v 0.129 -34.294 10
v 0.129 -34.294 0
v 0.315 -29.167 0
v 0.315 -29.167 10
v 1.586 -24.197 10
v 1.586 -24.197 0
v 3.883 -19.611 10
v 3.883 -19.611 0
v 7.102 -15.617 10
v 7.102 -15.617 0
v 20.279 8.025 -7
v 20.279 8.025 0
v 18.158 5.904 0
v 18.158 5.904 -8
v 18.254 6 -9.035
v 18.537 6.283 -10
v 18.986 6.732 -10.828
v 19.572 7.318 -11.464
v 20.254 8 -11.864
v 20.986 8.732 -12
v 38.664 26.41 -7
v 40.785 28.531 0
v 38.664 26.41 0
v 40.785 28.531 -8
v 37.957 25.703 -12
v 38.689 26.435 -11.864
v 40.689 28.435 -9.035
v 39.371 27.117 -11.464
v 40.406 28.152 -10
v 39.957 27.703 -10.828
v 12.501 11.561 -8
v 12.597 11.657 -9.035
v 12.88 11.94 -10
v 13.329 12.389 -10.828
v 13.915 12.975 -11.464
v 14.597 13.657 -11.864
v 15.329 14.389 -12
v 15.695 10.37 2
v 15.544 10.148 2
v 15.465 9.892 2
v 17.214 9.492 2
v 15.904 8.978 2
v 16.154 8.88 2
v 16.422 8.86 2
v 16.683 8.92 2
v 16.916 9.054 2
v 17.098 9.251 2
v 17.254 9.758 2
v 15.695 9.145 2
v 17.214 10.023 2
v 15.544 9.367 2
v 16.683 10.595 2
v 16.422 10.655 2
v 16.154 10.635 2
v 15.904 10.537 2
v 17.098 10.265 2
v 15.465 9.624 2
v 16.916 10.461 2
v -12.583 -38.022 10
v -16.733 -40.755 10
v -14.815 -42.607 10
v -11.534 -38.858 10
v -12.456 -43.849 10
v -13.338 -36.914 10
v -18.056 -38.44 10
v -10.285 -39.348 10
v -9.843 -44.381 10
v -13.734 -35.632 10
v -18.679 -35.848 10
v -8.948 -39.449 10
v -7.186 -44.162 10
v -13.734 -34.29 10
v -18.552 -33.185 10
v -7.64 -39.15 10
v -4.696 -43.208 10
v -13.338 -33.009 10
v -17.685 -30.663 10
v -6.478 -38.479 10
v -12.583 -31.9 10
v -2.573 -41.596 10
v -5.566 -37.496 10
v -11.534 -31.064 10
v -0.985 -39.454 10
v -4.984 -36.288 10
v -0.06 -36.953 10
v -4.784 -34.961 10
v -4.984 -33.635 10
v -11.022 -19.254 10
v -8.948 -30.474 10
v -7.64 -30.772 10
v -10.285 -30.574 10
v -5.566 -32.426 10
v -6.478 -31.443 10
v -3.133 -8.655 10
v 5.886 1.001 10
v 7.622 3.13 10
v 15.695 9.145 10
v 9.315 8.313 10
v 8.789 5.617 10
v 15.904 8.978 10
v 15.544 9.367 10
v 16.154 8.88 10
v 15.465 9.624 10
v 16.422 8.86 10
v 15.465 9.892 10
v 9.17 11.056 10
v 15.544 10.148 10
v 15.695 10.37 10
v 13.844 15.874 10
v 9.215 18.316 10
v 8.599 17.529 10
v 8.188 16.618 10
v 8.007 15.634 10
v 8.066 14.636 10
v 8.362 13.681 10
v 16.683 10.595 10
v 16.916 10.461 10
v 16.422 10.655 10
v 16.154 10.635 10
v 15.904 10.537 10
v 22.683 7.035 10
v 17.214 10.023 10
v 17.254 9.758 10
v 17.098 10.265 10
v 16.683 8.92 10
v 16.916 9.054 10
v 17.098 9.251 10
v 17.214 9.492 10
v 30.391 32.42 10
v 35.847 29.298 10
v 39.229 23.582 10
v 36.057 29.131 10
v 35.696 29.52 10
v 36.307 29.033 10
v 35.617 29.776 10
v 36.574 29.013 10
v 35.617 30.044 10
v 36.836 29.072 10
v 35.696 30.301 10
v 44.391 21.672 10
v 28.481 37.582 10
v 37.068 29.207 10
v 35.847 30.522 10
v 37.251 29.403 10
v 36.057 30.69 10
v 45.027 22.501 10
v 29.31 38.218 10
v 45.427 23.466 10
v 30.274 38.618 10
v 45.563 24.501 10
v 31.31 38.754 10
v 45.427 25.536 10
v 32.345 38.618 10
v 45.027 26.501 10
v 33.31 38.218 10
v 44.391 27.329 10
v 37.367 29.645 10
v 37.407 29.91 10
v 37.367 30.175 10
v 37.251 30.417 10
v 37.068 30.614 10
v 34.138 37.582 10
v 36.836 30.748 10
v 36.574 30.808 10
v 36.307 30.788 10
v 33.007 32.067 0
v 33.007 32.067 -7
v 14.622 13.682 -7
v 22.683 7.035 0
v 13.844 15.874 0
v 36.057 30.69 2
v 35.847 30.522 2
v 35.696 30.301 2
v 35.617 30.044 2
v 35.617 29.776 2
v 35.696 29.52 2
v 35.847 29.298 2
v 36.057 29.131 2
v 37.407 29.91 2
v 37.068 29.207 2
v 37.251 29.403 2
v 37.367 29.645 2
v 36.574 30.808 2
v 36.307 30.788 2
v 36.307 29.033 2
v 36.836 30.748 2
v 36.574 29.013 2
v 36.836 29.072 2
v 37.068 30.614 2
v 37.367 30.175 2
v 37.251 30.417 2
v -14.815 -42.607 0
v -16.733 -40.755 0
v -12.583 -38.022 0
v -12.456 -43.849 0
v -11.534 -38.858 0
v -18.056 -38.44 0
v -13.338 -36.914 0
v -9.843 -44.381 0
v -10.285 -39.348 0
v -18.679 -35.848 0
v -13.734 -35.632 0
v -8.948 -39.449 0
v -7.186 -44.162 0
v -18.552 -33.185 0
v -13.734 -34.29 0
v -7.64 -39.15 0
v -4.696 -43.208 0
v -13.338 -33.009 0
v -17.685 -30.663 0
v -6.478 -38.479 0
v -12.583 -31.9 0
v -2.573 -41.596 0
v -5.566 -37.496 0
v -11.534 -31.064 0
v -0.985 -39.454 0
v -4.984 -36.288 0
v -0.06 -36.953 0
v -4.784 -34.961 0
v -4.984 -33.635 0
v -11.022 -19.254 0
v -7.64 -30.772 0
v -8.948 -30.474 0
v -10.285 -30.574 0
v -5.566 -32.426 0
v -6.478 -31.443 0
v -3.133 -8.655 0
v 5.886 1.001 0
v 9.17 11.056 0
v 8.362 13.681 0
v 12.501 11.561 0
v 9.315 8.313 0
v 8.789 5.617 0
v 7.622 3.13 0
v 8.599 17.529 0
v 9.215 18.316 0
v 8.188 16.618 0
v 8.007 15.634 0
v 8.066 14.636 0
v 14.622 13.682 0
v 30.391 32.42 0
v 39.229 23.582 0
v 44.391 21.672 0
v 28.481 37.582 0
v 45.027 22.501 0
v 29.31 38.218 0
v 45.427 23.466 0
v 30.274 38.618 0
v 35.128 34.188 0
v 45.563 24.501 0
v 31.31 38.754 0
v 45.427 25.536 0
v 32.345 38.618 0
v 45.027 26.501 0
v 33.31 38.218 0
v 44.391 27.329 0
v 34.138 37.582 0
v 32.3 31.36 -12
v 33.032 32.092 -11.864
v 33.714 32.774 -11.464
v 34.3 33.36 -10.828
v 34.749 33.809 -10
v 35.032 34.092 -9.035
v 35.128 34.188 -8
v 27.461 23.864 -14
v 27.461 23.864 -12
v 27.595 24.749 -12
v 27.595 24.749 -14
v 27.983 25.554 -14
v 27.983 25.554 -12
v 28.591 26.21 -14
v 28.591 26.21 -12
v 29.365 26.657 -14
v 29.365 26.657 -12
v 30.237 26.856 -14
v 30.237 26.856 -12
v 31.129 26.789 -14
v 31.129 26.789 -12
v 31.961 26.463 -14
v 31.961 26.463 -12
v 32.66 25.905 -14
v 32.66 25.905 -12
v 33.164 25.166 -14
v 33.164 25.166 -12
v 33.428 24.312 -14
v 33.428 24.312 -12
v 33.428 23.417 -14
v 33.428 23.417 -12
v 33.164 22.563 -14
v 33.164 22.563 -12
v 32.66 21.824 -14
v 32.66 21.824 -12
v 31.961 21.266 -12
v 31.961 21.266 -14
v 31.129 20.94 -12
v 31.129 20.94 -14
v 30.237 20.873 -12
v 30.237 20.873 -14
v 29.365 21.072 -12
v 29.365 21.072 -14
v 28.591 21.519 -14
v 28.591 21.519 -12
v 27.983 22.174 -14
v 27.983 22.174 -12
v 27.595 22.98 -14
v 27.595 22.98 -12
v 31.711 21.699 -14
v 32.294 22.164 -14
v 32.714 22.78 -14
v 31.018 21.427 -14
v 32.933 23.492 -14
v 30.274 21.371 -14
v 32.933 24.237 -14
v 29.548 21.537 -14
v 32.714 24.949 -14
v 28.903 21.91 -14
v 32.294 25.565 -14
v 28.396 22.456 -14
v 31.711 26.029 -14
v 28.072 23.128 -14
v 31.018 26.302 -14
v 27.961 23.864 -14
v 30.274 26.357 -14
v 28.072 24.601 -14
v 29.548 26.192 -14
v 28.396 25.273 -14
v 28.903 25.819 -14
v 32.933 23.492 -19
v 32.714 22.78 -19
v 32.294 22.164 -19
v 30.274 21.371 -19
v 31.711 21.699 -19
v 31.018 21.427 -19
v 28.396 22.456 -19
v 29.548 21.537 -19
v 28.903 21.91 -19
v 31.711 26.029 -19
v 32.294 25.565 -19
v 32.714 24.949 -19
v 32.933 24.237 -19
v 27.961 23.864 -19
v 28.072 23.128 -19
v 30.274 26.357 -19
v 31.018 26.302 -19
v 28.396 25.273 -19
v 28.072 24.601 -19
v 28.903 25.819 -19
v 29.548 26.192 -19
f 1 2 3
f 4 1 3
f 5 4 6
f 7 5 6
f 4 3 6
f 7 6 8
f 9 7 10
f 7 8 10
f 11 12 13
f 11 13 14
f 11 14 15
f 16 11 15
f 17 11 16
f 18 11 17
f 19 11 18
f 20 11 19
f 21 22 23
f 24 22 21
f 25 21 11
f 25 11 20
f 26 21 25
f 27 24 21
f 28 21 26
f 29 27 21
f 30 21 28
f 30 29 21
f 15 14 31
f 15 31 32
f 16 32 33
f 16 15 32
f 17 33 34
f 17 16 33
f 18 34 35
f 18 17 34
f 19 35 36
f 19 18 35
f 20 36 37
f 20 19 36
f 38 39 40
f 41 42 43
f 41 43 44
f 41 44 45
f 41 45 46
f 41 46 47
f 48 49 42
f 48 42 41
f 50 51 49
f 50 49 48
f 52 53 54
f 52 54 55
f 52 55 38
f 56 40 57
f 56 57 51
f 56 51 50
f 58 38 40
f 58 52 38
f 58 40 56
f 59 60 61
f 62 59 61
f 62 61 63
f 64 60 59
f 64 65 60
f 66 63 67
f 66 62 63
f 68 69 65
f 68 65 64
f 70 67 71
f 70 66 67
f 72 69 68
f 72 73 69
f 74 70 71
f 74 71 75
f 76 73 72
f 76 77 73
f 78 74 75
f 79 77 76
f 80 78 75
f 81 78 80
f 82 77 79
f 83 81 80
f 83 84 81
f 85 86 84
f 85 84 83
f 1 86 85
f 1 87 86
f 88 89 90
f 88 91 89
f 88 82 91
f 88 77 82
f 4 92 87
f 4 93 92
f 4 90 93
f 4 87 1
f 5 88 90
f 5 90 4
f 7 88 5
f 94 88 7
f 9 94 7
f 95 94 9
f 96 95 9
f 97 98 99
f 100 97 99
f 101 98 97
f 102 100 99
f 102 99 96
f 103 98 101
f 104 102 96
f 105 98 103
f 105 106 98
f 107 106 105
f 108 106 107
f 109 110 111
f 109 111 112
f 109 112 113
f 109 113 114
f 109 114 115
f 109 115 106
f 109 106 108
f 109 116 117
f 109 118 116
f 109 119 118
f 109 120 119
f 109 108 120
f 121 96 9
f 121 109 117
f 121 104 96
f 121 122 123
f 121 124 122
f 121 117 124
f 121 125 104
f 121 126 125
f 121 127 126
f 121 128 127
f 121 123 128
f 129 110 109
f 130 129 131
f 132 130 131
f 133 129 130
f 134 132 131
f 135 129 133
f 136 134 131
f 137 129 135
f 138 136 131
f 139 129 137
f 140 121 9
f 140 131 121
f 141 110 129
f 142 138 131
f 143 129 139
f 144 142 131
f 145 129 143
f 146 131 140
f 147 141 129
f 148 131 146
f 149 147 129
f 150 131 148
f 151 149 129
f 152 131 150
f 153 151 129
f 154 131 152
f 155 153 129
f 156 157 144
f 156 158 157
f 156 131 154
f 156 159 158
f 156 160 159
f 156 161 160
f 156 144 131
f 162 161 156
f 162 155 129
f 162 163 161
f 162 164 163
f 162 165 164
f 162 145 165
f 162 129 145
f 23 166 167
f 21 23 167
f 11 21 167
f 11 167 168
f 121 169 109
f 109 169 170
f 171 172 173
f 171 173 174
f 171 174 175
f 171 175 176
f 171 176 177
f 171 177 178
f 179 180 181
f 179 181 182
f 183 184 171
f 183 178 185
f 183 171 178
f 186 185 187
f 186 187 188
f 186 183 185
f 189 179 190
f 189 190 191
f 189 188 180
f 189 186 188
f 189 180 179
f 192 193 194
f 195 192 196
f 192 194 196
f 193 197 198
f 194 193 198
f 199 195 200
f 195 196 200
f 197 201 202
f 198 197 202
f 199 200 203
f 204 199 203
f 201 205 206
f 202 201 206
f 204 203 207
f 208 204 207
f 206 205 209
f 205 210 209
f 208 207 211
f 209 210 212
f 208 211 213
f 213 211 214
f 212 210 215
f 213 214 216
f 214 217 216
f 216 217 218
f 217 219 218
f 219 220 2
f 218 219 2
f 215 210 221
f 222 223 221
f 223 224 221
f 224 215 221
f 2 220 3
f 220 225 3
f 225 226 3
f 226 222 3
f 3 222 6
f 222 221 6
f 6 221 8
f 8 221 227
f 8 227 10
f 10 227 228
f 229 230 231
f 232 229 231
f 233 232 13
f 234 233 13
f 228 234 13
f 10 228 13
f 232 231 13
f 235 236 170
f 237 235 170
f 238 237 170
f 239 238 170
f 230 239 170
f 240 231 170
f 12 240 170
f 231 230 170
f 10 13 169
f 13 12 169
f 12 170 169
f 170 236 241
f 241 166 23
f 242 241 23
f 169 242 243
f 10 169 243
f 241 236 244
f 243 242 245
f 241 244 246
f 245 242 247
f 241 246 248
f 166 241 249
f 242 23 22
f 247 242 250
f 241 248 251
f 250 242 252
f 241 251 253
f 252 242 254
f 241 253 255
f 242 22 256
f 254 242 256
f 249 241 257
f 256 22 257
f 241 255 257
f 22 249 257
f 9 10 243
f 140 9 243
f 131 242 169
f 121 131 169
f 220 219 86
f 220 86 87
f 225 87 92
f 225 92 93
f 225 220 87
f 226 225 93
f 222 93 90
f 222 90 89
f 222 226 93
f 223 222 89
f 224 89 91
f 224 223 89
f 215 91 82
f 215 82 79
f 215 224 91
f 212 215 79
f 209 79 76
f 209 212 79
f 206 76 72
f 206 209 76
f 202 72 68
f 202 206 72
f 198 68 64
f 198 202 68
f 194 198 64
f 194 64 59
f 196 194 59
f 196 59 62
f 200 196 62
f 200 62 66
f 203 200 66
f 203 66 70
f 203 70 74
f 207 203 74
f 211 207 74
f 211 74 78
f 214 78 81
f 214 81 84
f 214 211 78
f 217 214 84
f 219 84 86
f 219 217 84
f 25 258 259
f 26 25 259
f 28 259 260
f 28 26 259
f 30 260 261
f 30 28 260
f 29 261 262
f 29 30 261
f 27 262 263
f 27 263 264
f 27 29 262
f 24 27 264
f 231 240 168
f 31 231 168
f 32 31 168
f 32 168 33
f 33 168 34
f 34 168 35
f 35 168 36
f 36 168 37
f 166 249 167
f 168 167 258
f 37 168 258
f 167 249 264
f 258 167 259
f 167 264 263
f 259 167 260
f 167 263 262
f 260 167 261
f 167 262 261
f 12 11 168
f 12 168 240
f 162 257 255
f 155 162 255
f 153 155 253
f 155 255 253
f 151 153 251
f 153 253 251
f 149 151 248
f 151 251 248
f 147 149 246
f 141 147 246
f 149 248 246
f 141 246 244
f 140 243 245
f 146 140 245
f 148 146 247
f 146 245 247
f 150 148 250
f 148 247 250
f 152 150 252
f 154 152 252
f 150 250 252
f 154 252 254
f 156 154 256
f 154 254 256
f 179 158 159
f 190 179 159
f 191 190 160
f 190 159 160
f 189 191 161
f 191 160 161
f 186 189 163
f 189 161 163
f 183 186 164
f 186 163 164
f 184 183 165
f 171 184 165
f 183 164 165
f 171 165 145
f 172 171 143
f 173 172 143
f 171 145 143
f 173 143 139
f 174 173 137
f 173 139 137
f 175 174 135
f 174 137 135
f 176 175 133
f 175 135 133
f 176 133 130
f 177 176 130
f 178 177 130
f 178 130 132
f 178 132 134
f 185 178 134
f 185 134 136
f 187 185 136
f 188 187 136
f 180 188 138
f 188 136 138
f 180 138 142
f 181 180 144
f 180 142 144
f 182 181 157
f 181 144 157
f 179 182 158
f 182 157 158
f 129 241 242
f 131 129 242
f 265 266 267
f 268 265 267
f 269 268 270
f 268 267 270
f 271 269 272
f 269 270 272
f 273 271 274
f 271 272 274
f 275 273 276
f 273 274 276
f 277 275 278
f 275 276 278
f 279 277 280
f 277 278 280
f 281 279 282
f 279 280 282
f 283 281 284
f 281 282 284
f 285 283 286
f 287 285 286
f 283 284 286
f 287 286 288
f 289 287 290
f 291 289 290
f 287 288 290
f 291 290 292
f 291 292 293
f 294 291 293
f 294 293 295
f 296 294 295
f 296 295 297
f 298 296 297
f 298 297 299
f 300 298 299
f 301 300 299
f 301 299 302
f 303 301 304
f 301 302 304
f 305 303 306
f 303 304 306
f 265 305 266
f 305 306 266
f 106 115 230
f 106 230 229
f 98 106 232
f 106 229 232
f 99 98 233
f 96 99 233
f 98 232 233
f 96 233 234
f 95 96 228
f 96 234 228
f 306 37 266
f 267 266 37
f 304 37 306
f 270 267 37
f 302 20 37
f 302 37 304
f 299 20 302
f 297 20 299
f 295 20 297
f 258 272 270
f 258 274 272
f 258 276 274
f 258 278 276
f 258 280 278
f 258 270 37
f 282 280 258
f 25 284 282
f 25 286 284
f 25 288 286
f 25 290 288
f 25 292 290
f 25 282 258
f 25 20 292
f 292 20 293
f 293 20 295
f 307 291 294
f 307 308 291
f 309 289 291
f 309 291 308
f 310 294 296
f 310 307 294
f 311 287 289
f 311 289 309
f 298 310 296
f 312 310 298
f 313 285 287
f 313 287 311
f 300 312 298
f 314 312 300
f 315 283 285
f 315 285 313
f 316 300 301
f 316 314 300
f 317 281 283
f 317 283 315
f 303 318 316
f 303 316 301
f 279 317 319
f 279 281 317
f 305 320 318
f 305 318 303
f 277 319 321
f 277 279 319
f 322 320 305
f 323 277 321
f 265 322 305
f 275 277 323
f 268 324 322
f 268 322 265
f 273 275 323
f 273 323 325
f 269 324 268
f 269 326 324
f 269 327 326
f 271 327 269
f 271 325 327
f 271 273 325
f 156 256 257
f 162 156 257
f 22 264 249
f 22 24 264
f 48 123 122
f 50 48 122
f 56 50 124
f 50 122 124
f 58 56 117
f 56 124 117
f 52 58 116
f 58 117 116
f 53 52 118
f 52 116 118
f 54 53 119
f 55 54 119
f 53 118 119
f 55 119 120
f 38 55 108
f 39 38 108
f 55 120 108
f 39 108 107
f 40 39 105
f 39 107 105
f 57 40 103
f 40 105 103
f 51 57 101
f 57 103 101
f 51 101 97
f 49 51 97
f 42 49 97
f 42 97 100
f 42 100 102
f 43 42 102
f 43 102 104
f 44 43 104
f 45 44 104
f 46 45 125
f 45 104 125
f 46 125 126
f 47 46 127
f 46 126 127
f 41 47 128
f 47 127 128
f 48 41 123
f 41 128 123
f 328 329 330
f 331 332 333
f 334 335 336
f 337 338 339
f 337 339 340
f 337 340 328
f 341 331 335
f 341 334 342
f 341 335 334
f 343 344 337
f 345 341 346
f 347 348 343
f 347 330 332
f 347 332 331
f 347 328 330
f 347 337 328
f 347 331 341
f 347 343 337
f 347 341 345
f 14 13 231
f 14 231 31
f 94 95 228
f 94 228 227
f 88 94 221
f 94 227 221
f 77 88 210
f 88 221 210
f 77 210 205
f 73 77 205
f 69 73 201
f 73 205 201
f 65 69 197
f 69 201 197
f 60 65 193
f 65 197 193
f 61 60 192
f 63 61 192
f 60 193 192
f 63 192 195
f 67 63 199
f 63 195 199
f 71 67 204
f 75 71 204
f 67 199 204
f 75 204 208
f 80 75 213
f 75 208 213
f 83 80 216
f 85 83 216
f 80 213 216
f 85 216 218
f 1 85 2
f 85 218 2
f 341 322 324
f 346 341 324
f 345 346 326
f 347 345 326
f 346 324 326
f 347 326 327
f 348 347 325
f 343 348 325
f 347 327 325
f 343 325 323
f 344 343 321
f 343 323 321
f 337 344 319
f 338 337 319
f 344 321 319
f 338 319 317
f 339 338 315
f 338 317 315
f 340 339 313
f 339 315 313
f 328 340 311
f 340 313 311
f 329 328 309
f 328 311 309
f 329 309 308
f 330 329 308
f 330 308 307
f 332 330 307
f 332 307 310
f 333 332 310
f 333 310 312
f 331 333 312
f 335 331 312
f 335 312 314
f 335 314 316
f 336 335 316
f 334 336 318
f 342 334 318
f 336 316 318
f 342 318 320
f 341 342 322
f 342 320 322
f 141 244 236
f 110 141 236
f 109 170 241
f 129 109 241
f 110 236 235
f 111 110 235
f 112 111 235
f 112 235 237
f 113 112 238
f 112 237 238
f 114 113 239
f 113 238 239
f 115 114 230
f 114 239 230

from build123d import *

# Parameters (mm, degrees)
SKETCH_2_R          = 4.5
EXTRUDE_1_DEPTH     = 10
EXTRUDE_2_DEPTH     = 4
SKETCH_5_R          = 3
EXTRUDE_3_DEPTH     = 2
SKETCH_6_R          = 0.9
CUT_EXTRUDE_1_DEPTH = 8
SKETCH_7_R          = 2.5
EXTRUDE_4_DEPTH     = 5


with BuildPart() as part:
    # 草图2 → 凸台-拉伸1 (new body)
    with BuildSketch(Plane.XY):
        with BuildLine():
            Line((7.102160211, -15.616687508), (44.391240582, 21.672392863))
            ThreePointArc((44.391240582, 21.672392863), (45.562813457, 24.500819988), (44.391240582, 27.329247112))
            Line((44.391240582, 27.329247112), (34.138192255, 37.58229544))
            ThreePointArc((34.138192255, 37.58229544), (31.30976513, 38.753868315), (28.481338005, 37.58229544))
            Line((28.481338005, 37.58229544), (9.215390399, 18.316347834))
            ThreePointArc((9.215390399, 18.316347834), (8.067593218, 16.131525495), (8.362136672, 13.681192624))
            ThreePointArc((8.362136672, 13.681192624), (9.134610316, 6.948541986), (5.886174479, 1.001024456))
            ThreePointArc((5.886174479, 1.001024456), (-7.225109998, -13.84439598), (-17.685225472, -30.663381468))
            ThreePointArc((-17.685225472, -30.663381468), (-11.168239652, -44.207967845), (0.129369861, -34.293788928))
            ThreePointArc((0.129369861, -34.293788928), (1.585802578, -24.197384934), (7.102160211, -15.616687508))
        make_face()
        with Locations((-9.283850525, -34.961173895)):
            Circle(SKETCH_2_R, mode=Mode.SUBTRACT)
        Polygon((39.229361079, 23.581581172), (22.6830624, 7.035282492), (13.844227635, 15.874117257), (30.390526315, 32.420415937), align=None, mode=Mode.SUBTRACT)
    extrude(amount=EXTRUDE_1_DEPTH)

    # 草图4 → 凸台-拉伸2 (add, symmetric)
    with BuildSketch(Plane(origin=(3.298406554, -3.298406554, 0), x_dir=(0, 0, -1), z_dir=(0.7071067811865492, -0.7071067811865458, 0))):
        with BuildLine():
            Line((0, 49.014043199), (0, 46.014043199))
            Line((0, 46.014043199), (7, 46.014043199))
            Line((7, 46.014043199), (7, 20.014043199))
            Line((7, 20.014043199), (0, 20.014043199))
            Line((0, 20.014043199), (0, 17.014043199))
            Line((0, 17.014043199), (8, 17.014043199))
            ThreePointArc((8, 17.014043199), (10.828427125, 18.185616074), (12, 21.014043199))
            Line((12, 21.014043199), (12, 45.014043199))
            ThreePointArc((12, 45.014043199), (10.828427125, 47.842470323), (8, 49.014043199))
            Line((8, 49.014043199), (0, 49.014043199))
        make_face()
    extrude(amount=EXTRUDE_2_DEPTH, both=True)

    # 草图5 → 凸台-拉伸3 (add)
    with BuildSketch(Plane(origin=(0, 0, -12), x_dir=(-1, 0, 0), z_dir=(0, 0, -1))):
        with Locations((-30.461236993, 23.864423885)):
            Circle(SKETCH_5_R)
    extrude(amount=EXTRUDE_3_DEPTH)

    # 草图6 → 切除-拉伸1 (cut)
    with BuildSketch(Plane.XY.offset(10)):
        with Locations((16.354456708, 9.7576436)):
            Circle(SKETCH_6_R)
        with Locations((36.506999972, 29.910186864)):
            Circle(SKETCH_6_R)
    extrude(amount=-CUT_EXTRUDE_1_DEPTH, mode=Mode.SUBTRACT)

    # 草图7 → 凸台-拉伸4 (add)
    with BuildSketch(Plane(origin=(0, 0, -14), x_dir=(-1, 0, 0), z_dir=(0, 0, -1))):
        with Locations((-30.461236993, 23.864423885)):
            Circle(SKETCH_7_R)
    extrude(amount=EXTRUDE_4_DEPTH)


solid = part.part
